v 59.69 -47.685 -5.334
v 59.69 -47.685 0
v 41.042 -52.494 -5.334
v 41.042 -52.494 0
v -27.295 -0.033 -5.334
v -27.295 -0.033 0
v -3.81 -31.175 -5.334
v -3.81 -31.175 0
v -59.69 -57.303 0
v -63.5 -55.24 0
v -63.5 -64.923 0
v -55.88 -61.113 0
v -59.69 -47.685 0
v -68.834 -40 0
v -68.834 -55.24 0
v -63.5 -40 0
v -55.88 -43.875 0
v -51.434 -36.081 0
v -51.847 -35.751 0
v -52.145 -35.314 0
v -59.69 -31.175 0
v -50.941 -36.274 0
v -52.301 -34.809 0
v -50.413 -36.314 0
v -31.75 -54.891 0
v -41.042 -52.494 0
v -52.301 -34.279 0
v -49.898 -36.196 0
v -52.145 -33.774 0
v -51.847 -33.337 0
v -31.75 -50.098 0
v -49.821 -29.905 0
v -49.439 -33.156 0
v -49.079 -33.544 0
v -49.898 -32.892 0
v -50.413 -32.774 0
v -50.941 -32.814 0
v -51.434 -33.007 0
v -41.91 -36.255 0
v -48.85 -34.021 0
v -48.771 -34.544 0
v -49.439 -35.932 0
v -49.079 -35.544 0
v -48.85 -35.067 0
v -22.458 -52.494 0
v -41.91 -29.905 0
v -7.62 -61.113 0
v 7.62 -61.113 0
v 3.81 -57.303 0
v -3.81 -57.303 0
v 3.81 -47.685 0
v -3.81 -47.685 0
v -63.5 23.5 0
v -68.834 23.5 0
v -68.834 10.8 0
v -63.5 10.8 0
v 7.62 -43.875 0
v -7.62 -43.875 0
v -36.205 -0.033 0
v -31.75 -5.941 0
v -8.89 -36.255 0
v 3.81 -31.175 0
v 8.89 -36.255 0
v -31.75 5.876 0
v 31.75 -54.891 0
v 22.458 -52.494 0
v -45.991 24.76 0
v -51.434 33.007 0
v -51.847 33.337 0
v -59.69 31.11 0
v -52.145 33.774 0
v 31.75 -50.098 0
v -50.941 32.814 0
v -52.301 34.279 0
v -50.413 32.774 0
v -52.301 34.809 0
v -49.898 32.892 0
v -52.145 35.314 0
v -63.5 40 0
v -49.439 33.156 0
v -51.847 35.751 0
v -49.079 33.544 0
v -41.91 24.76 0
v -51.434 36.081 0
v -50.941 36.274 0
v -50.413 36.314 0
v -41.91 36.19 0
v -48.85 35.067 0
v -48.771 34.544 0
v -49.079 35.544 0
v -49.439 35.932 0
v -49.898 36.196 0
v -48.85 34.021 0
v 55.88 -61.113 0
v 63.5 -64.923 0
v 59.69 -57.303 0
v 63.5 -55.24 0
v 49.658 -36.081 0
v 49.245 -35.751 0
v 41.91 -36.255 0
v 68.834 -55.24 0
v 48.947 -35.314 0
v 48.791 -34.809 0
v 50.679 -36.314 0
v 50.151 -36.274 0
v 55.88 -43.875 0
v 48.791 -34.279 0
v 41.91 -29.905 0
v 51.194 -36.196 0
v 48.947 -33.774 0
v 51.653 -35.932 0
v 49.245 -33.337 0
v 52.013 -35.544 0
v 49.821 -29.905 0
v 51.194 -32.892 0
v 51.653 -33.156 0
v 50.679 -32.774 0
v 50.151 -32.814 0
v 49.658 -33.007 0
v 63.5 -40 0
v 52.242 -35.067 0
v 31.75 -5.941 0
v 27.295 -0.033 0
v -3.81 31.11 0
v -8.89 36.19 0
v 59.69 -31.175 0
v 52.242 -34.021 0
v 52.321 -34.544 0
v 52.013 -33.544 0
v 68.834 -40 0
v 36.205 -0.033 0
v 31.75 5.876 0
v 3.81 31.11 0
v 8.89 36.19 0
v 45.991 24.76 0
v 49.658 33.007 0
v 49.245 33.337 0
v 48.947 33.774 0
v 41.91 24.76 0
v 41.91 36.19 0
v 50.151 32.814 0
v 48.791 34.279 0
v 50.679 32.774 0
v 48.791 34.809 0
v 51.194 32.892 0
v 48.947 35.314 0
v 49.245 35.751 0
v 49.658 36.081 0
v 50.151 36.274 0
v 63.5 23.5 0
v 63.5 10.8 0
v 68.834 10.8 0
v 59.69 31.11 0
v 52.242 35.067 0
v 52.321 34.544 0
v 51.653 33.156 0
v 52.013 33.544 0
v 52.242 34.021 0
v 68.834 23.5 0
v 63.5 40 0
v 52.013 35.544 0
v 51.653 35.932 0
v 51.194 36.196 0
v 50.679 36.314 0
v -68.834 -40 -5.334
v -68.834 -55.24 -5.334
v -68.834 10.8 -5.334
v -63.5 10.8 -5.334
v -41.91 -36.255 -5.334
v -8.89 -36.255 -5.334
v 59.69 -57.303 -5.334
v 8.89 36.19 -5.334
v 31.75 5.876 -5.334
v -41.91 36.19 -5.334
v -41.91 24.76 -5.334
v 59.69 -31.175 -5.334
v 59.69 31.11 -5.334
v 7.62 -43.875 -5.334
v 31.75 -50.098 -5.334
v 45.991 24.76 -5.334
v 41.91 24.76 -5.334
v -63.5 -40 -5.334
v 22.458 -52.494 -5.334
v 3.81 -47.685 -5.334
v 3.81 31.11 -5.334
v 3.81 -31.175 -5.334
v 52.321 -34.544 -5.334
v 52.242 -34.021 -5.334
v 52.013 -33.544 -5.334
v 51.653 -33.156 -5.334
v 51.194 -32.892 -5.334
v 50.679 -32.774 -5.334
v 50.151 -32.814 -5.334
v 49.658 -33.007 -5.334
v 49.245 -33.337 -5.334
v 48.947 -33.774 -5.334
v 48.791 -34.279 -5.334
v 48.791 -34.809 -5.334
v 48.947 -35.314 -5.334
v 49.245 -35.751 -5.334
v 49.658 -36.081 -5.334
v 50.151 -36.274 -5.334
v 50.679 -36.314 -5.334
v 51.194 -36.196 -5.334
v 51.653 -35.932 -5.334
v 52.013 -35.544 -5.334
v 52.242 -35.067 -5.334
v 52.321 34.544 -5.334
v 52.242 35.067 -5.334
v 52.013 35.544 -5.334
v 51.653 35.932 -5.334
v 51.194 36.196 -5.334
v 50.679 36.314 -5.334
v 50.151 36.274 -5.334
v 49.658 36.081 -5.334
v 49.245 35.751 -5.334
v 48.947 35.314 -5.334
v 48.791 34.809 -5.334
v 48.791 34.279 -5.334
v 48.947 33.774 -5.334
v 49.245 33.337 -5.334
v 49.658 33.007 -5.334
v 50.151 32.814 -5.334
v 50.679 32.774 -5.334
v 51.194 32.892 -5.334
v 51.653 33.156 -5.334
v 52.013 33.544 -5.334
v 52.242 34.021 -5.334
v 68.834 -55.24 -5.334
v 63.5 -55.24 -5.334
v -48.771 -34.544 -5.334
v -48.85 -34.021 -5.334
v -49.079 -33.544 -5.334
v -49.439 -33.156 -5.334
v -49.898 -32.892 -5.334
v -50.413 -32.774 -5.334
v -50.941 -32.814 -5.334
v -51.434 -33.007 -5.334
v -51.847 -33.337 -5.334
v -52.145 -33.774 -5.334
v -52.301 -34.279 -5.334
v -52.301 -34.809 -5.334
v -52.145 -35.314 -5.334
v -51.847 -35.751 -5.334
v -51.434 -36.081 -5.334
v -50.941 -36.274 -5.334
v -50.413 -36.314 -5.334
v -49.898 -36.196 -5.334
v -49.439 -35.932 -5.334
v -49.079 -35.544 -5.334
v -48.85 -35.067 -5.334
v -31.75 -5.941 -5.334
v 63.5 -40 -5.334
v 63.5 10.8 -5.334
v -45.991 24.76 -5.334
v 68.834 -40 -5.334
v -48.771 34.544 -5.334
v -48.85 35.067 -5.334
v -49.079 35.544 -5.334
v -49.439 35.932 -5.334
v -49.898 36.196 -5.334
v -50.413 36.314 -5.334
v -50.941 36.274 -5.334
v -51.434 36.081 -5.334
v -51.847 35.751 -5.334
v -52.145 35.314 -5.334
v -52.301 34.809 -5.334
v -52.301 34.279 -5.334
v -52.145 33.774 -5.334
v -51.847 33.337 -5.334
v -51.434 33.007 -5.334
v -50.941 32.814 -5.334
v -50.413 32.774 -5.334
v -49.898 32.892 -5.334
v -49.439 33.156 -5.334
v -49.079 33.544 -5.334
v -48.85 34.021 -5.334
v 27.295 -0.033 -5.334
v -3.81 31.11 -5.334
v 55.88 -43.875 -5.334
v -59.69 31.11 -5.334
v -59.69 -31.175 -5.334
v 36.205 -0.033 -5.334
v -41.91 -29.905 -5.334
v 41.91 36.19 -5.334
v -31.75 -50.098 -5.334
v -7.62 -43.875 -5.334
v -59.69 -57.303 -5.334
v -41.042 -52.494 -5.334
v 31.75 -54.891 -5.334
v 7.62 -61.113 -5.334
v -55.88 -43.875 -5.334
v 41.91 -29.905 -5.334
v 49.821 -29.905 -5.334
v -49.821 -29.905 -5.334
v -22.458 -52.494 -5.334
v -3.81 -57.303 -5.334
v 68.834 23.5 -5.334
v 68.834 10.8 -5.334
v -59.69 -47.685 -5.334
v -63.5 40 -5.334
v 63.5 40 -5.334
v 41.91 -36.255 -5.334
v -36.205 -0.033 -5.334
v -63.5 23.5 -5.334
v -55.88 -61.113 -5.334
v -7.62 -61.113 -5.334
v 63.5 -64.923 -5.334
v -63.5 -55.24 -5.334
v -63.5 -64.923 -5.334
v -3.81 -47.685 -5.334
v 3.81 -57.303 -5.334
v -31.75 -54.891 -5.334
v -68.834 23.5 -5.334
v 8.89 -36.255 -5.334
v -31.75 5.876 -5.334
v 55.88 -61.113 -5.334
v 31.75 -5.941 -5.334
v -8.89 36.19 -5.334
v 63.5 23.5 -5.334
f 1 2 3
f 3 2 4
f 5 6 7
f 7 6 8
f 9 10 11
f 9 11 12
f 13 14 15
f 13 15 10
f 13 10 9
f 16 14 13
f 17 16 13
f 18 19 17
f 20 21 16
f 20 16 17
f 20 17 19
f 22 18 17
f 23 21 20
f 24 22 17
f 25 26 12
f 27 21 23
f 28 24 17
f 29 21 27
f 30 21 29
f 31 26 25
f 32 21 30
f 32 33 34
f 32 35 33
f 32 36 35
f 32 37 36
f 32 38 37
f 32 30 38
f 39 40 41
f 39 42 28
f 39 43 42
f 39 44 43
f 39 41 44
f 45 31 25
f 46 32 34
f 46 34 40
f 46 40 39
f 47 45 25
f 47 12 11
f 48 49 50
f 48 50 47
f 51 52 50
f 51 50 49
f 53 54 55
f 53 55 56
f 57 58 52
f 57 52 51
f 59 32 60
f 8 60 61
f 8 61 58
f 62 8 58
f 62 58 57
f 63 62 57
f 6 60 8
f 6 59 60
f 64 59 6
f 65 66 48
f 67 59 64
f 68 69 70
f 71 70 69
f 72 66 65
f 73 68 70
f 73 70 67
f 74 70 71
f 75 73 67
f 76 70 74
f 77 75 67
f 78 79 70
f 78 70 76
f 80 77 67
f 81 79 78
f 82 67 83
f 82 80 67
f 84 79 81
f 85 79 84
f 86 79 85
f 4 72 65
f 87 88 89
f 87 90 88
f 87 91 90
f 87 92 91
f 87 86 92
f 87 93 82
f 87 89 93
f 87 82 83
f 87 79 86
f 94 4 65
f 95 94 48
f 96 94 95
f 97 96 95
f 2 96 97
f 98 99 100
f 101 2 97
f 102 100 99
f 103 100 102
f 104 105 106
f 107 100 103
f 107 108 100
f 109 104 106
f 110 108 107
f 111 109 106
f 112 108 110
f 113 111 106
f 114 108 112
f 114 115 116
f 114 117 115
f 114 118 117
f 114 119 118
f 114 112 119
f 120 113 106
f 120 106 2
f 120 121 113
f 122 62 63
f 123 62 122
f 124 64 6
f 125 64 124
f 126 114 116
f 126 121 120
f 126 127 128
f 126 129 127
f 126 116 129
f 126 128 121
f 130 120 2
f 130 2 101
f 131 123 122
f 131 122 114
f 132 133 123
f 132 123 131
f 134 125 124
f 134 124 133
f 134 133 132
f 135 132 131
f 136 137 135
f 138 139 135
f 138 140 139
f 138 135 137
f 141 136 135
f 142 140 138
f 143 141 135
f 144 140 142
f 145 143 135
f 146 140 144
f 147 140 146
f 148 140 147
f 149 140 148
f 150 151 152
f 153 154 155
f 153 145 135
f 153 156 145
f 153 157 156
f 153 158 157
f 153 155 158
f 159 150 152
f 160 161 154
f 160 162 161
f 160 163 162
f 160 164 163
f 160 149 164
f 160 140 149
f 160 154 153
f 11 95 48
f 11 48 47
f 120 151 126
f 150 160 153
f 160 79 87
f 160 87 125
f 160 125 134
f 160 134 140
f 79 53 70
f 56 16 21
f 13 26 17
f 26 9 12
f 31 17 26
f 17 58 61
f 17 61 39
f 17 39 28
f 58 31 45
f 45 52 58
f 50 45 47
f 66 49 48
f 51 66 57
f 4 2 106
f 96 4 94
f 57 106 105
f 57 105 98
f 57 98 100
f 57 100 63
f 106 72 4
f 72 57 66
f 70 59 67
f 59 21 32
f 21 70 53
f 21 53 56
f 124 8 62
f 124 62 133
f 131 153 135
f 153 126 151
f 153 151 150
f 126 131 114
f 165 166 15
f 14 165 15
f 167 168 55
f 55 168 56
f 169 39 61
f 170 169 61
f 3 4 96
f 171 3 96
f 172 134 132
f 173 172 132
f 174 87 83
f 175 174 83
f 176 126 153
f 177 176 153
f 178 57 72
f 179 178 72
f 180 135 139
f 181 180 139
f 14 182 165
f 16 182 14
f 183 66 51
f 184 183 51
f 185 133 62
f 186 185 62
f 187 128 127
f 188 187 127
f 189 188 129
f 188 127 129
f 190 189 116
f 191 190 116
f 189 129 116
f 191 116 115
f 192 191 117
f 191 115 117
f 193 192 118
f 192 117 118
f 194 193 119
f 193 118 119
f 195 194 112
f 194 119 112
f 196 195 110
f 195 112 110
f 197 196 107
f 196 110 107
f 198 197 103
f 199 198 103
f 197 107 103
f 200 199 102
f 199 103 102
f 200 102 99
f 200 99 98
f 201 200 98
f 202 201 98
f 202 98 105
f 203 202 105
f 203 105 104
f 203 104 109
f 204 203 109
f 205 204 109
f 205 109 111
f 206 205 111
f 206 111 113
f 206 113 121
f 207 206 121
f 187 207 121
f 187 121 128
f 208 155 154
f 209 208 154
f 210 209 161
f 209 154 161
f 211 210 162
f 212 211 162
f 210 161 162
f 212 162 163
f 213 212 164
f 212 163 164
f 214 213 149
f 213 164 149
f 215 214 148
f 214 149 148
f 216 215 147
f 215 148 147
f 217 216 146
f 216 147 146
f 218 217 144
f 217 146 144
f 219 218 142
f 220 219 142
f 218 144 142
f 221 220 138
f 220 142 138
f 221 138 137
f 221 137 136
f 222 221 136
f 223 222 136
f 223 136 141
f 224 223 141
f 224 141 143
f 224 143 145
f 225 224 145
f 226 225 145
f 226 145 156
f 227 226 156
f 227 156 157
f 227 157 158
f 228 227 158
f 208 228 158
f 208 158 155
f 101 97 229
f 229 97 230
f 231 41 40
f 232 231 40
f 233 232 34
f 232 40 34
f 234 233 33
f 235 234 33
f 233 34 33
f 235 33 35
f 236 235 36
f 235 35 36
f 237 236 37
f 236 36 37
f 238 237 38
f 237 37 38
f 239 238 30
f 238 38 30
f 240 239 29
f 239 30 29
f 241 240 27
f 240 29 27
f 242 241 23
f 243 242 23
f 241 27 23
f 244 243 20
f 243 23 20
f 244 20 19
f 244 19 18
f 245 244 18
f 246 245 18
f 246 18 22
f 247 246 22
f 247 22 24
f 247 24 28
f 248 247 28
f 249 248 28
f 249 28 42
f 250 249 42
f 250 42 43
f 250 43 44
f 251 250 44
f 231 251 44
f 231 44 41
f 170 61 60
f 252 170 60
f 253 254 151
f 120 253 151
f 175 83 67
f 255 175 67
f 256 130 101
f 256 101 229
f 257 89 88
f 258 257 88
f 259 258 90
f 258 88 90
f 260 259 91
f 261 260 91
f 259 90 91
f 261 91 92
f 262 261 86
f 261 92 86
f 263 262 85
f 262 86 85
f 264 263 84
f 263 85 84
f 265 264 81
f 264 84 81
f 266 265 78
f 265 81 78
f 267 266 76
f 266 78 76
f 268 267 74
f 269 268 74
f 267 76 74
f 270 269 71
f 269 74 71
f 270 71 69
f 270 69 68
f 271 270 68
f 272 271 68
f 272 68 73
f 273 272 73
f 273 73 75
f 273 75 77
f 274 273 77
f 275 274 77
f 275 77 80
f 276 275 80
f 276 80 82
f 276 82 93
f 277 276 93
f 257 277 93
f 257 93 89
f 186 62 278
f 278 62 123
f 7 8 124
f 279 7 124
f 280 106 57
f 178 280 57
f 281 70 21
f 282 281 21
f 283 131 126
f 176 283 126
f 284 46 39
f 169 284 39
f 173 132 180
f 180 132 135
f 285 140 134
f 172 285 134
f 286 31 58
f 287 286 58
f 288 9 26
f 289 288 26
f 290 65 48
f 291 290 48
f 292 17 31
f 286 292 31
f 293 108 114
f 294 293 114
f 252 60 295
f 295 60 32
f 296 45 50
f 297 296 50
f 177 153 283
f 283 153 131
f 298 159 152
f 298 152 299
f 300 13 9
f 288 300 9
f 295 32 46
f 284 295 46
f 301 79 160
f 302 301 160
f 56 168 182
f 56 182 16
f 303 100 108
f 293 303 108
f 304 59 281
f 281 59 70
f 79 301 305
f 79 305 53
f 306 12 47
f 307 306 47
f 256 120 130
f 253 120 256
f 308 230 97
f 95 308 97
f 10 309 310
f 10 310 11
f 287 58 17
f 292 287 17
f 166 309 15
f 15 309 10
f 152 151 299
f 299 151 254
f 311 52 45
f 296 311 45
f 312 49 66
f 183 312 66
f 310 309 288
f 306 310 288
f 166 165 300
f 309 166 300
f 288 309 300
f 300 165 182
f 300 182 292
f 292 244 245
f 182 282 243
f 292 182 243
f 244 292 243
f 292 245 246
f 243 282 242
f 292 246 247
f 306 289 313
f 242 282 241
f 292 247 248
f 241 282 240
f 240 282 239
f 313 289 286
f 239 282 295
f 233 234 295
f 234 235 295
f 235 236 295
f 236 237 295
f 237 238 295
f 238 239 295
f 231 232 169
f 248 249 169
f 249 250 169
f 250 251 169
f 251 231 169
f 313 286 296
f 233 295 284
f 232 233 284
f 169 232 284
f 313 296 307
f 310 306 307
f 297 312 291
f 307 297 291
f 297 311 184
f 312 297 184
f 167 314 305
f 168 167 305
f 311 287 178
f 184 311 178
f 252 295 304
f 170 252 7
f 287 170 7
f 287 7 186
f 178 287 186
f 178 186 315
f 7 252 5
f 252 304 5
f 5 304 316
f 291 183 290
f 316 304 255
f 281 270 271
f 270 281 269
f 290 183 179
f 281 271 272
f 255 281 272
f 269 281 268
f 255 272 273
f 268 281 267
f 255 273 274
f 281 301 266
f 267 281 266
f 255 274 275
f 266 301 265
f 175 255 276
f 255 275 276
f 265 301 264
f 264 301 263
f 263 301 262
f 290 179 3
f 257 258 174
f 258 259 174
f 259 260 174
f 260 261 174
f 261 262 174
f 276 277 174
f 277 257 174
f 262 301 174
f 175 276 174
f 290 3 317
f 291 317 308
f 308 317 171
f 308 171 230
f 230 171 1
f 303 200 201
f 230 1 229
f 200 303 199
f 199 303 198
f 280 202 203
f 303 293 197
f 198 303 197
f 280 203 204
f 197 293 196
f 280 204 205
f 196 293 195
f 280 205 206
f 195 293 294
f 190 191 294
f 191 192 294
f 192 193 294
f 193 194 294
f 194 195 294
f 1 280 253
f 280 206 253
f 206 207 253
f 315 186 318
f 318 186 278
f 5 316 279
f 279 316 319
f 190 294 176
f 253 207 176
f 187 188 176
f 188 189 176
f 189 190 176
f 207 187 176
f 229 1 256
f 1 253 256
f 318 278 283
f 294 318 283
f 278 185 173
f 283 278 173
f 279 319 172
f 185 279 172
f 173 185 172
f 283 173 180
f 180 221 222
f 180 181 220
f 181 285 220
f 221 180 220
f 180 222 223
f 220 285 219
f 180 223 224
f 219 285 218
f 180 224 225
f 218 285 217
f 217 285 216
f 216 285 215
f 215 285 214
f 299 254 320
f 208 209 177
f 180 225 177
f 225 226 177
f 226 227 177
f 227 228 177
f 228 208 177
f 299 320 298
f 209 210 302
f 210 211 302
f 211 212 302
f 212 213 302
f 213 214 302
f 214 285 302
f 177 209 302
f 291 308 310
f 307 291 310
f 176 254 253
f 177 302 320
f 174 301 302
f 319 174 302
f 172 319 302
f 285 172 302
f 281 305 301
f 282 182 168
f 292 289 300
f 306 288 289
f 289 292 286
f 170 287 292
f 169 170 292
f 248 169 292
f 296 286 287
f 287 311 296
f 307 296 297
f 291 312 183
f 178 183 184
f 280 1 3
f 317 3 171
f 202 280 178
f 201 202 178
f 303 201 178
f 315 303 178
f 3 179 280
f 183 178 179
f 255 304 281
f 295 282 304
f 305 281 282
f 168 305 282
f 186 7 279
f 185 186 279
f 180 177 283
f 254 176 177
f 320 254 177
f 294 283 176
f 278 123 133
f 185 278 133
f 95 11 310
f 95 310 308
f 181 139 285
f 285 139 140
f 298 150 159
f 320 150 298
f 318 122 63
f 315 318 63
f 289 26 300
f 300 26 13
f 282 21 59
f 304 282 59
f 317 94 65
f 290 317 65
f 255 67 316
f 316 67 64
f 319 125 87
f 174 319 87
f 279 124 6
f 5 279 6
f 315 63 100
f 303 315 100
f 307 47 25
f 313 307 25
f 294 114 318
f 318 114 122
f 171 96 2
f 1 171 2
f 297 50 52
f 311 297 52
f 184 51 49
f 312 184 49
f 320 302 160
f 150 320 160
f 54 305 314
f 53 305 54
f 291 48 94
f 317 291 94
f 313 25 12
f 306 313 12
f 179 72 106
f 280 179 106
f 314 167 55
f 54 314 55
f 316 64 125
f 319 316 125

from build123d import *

# Parameters (mm, degrees)
SKETCH1_W                = 127
SKETCH1_H                = 80
TOP_DEPTH                = 5.334
SKETCH2_W                = 127
SKETCH2_H                = 5.334
BOTTOM_DEPTH             = 24.923365698
SKETCH4_W                = 5.334
SKETCH4_H                = 15.24
SKETCH4_H_2              = 12.7
RIGHTTOOTH_DEPTH         = 5.334
SKETCH5_W                = 5.334
SKETCH5_H                = 15.24
SKETCH5_H_2              = 12.7
LEFTTOOTH_DEPTH          = 5.334
SKETCH6_R                = 1.775
PERFBOARDSCREWCUTS_DEPTH = 95.771380308
DESIGN_DEPTH             = 5.334


with BuildPart() as part:
    # Sketch1 → Top (new body)
    with BuildSketch(Plane.XY):
        Rectangle(SKETCH1_W, SKETCH1_H)
    extrude(amount=-TOP_DEPTH)

    # Sketch2 → Bottom (add)
    with BuildSketch(Plane.XZ.offset(40)):
        with Locations((0, -2.667)):
            Rectangle(SKETCH2_W, SKETCH2_H)
    extrude(amount=BOTTOM_DEPTH)

    # Sketch4 → RightTooth (add)
    with BuildSketch(Plane(origin=(63.5, 0, 0), x_dir=(0, 0, -1), z_dir=(1, 0, 0))):
        with Locations((2.667, -47.62)):
            Rectangle(SKETCH4_W, SKETCH4_H)
        with Locations((2.667, 17.15)):
            Rectangle(SKETCH4_W, SKETCH4_H_2)
    extrude(amount=RIGHTTOOTH_DEPTH)

    # Sketch5 → LeftTooth (add)
    with BuildSketch(Plane.ZY.offset(63.5)):
        with Locations((-2.667, -47.62)):
            Rectangle(SKETCH5_W, SKETCH5_H)
        with Locations((-2.667, 17.15)):
            Rectangle(SKETCH5_W, SKETCH5_H_2)
    extrude(amount=LEFTTOOTH_DEPTH)

    # Sketch6 → PerfBoardScrewCuts (cut, through all)
    with BuildSketch(Plane.XY):
        with Locations((-50.546, 34.544)):
            Circle(SKETCH6_R)
        with Locations((50.546, 34.544)):
            Circle(SKETCH6_R)
        with Locations((50.546, -34.544)):
            Circle(SKETCH6_R)
        with Locations((-50.546, -34.544)):
            Circle(SKETCH6_R)
    extrude(amount=-PERFBOARDSCREWCUTS_DEPTH, mode=Mode.SUBTRACT)

    # Sketch7 → Design (cut)
    with BuildSketch(Plane.XY):
        Polygon((-36.205413156, -0.032550322), (-59.69, 31.11), (-59.69, -31.175100644), align=None)
        Polygon((-41.91, 24.76), (-45.9906408, 24.76), (-31.75, 5.87570471), (-8.89, 36.19), (-41.91, 36.19), align=None)
        Polygon((-8.89, -36.255100644), (-31.75, -5.940805354), (-49.821467111, -29.905100644), (-41.91, -29.905100644), (-41.91, -36.255100644), align=None)
        Polygon((-3.81, 31.11), (-27.294586844, -0.032550322), (-3.81, -31.175100644), align=None)
        Polygon((3.81, -31.175100644), (27.294586844, -0.032550322), (3.81, 31.11), align=None)
        Polygon((45.9906408, 24.76), (41.91, 24.76), (41.91, 36.19), (8.89, 36.19), (31.75, 5.87570471), align=None)
        Polygon((59.69, 31.11), (36.205413156, -0.032550322), (59.69, -31.175100644), align=None)
        Polygon((49.821467111, -29.905100644), (31.75, -5.940805354), (8.89, -36.255100644), (41.91, -36.255100644), (41.91, -29.905100644), align=None)
        Polygon((55.88, -43.875100644), (7.62, -43.875100644), (31.75, -50.097955181), align=None)
        Polygon((59.69, -47.685100644), (41.041907363, -52.494233171), (59.69, -57.303365698), align=None)
        Polygon((55.88, -61.113365698), (31.75, -54.890511161), (7.62, -61.113365698), align=None)
        Polygon((3.81, -57.303365698), (22.458092637, -52.494233171), (3.81, -47.685100644), align=None)
        Polygon((-3.81, -47.685100644), (-22.458092637, -52.494233171), (-3.81, -57.303365698), align=None)
        Polygon((-55.88, -43.875100644), (-31.75, -50.097955181), (-7.62, -43.875100644), align=None)
        Polygon((-41.041907363, -52.494233171), (-59.69, -47.685100644), (-59.69, -57.303365698), align=None)
        Polygon((-7.62, -61.113365698), (-31.75, -54.890511161), (-55.88, -61.113365698), align=None)
    extrude(amount=-DESIGN_DEPTH, mode=Mode.SUBTRACT)


solid = part.part
